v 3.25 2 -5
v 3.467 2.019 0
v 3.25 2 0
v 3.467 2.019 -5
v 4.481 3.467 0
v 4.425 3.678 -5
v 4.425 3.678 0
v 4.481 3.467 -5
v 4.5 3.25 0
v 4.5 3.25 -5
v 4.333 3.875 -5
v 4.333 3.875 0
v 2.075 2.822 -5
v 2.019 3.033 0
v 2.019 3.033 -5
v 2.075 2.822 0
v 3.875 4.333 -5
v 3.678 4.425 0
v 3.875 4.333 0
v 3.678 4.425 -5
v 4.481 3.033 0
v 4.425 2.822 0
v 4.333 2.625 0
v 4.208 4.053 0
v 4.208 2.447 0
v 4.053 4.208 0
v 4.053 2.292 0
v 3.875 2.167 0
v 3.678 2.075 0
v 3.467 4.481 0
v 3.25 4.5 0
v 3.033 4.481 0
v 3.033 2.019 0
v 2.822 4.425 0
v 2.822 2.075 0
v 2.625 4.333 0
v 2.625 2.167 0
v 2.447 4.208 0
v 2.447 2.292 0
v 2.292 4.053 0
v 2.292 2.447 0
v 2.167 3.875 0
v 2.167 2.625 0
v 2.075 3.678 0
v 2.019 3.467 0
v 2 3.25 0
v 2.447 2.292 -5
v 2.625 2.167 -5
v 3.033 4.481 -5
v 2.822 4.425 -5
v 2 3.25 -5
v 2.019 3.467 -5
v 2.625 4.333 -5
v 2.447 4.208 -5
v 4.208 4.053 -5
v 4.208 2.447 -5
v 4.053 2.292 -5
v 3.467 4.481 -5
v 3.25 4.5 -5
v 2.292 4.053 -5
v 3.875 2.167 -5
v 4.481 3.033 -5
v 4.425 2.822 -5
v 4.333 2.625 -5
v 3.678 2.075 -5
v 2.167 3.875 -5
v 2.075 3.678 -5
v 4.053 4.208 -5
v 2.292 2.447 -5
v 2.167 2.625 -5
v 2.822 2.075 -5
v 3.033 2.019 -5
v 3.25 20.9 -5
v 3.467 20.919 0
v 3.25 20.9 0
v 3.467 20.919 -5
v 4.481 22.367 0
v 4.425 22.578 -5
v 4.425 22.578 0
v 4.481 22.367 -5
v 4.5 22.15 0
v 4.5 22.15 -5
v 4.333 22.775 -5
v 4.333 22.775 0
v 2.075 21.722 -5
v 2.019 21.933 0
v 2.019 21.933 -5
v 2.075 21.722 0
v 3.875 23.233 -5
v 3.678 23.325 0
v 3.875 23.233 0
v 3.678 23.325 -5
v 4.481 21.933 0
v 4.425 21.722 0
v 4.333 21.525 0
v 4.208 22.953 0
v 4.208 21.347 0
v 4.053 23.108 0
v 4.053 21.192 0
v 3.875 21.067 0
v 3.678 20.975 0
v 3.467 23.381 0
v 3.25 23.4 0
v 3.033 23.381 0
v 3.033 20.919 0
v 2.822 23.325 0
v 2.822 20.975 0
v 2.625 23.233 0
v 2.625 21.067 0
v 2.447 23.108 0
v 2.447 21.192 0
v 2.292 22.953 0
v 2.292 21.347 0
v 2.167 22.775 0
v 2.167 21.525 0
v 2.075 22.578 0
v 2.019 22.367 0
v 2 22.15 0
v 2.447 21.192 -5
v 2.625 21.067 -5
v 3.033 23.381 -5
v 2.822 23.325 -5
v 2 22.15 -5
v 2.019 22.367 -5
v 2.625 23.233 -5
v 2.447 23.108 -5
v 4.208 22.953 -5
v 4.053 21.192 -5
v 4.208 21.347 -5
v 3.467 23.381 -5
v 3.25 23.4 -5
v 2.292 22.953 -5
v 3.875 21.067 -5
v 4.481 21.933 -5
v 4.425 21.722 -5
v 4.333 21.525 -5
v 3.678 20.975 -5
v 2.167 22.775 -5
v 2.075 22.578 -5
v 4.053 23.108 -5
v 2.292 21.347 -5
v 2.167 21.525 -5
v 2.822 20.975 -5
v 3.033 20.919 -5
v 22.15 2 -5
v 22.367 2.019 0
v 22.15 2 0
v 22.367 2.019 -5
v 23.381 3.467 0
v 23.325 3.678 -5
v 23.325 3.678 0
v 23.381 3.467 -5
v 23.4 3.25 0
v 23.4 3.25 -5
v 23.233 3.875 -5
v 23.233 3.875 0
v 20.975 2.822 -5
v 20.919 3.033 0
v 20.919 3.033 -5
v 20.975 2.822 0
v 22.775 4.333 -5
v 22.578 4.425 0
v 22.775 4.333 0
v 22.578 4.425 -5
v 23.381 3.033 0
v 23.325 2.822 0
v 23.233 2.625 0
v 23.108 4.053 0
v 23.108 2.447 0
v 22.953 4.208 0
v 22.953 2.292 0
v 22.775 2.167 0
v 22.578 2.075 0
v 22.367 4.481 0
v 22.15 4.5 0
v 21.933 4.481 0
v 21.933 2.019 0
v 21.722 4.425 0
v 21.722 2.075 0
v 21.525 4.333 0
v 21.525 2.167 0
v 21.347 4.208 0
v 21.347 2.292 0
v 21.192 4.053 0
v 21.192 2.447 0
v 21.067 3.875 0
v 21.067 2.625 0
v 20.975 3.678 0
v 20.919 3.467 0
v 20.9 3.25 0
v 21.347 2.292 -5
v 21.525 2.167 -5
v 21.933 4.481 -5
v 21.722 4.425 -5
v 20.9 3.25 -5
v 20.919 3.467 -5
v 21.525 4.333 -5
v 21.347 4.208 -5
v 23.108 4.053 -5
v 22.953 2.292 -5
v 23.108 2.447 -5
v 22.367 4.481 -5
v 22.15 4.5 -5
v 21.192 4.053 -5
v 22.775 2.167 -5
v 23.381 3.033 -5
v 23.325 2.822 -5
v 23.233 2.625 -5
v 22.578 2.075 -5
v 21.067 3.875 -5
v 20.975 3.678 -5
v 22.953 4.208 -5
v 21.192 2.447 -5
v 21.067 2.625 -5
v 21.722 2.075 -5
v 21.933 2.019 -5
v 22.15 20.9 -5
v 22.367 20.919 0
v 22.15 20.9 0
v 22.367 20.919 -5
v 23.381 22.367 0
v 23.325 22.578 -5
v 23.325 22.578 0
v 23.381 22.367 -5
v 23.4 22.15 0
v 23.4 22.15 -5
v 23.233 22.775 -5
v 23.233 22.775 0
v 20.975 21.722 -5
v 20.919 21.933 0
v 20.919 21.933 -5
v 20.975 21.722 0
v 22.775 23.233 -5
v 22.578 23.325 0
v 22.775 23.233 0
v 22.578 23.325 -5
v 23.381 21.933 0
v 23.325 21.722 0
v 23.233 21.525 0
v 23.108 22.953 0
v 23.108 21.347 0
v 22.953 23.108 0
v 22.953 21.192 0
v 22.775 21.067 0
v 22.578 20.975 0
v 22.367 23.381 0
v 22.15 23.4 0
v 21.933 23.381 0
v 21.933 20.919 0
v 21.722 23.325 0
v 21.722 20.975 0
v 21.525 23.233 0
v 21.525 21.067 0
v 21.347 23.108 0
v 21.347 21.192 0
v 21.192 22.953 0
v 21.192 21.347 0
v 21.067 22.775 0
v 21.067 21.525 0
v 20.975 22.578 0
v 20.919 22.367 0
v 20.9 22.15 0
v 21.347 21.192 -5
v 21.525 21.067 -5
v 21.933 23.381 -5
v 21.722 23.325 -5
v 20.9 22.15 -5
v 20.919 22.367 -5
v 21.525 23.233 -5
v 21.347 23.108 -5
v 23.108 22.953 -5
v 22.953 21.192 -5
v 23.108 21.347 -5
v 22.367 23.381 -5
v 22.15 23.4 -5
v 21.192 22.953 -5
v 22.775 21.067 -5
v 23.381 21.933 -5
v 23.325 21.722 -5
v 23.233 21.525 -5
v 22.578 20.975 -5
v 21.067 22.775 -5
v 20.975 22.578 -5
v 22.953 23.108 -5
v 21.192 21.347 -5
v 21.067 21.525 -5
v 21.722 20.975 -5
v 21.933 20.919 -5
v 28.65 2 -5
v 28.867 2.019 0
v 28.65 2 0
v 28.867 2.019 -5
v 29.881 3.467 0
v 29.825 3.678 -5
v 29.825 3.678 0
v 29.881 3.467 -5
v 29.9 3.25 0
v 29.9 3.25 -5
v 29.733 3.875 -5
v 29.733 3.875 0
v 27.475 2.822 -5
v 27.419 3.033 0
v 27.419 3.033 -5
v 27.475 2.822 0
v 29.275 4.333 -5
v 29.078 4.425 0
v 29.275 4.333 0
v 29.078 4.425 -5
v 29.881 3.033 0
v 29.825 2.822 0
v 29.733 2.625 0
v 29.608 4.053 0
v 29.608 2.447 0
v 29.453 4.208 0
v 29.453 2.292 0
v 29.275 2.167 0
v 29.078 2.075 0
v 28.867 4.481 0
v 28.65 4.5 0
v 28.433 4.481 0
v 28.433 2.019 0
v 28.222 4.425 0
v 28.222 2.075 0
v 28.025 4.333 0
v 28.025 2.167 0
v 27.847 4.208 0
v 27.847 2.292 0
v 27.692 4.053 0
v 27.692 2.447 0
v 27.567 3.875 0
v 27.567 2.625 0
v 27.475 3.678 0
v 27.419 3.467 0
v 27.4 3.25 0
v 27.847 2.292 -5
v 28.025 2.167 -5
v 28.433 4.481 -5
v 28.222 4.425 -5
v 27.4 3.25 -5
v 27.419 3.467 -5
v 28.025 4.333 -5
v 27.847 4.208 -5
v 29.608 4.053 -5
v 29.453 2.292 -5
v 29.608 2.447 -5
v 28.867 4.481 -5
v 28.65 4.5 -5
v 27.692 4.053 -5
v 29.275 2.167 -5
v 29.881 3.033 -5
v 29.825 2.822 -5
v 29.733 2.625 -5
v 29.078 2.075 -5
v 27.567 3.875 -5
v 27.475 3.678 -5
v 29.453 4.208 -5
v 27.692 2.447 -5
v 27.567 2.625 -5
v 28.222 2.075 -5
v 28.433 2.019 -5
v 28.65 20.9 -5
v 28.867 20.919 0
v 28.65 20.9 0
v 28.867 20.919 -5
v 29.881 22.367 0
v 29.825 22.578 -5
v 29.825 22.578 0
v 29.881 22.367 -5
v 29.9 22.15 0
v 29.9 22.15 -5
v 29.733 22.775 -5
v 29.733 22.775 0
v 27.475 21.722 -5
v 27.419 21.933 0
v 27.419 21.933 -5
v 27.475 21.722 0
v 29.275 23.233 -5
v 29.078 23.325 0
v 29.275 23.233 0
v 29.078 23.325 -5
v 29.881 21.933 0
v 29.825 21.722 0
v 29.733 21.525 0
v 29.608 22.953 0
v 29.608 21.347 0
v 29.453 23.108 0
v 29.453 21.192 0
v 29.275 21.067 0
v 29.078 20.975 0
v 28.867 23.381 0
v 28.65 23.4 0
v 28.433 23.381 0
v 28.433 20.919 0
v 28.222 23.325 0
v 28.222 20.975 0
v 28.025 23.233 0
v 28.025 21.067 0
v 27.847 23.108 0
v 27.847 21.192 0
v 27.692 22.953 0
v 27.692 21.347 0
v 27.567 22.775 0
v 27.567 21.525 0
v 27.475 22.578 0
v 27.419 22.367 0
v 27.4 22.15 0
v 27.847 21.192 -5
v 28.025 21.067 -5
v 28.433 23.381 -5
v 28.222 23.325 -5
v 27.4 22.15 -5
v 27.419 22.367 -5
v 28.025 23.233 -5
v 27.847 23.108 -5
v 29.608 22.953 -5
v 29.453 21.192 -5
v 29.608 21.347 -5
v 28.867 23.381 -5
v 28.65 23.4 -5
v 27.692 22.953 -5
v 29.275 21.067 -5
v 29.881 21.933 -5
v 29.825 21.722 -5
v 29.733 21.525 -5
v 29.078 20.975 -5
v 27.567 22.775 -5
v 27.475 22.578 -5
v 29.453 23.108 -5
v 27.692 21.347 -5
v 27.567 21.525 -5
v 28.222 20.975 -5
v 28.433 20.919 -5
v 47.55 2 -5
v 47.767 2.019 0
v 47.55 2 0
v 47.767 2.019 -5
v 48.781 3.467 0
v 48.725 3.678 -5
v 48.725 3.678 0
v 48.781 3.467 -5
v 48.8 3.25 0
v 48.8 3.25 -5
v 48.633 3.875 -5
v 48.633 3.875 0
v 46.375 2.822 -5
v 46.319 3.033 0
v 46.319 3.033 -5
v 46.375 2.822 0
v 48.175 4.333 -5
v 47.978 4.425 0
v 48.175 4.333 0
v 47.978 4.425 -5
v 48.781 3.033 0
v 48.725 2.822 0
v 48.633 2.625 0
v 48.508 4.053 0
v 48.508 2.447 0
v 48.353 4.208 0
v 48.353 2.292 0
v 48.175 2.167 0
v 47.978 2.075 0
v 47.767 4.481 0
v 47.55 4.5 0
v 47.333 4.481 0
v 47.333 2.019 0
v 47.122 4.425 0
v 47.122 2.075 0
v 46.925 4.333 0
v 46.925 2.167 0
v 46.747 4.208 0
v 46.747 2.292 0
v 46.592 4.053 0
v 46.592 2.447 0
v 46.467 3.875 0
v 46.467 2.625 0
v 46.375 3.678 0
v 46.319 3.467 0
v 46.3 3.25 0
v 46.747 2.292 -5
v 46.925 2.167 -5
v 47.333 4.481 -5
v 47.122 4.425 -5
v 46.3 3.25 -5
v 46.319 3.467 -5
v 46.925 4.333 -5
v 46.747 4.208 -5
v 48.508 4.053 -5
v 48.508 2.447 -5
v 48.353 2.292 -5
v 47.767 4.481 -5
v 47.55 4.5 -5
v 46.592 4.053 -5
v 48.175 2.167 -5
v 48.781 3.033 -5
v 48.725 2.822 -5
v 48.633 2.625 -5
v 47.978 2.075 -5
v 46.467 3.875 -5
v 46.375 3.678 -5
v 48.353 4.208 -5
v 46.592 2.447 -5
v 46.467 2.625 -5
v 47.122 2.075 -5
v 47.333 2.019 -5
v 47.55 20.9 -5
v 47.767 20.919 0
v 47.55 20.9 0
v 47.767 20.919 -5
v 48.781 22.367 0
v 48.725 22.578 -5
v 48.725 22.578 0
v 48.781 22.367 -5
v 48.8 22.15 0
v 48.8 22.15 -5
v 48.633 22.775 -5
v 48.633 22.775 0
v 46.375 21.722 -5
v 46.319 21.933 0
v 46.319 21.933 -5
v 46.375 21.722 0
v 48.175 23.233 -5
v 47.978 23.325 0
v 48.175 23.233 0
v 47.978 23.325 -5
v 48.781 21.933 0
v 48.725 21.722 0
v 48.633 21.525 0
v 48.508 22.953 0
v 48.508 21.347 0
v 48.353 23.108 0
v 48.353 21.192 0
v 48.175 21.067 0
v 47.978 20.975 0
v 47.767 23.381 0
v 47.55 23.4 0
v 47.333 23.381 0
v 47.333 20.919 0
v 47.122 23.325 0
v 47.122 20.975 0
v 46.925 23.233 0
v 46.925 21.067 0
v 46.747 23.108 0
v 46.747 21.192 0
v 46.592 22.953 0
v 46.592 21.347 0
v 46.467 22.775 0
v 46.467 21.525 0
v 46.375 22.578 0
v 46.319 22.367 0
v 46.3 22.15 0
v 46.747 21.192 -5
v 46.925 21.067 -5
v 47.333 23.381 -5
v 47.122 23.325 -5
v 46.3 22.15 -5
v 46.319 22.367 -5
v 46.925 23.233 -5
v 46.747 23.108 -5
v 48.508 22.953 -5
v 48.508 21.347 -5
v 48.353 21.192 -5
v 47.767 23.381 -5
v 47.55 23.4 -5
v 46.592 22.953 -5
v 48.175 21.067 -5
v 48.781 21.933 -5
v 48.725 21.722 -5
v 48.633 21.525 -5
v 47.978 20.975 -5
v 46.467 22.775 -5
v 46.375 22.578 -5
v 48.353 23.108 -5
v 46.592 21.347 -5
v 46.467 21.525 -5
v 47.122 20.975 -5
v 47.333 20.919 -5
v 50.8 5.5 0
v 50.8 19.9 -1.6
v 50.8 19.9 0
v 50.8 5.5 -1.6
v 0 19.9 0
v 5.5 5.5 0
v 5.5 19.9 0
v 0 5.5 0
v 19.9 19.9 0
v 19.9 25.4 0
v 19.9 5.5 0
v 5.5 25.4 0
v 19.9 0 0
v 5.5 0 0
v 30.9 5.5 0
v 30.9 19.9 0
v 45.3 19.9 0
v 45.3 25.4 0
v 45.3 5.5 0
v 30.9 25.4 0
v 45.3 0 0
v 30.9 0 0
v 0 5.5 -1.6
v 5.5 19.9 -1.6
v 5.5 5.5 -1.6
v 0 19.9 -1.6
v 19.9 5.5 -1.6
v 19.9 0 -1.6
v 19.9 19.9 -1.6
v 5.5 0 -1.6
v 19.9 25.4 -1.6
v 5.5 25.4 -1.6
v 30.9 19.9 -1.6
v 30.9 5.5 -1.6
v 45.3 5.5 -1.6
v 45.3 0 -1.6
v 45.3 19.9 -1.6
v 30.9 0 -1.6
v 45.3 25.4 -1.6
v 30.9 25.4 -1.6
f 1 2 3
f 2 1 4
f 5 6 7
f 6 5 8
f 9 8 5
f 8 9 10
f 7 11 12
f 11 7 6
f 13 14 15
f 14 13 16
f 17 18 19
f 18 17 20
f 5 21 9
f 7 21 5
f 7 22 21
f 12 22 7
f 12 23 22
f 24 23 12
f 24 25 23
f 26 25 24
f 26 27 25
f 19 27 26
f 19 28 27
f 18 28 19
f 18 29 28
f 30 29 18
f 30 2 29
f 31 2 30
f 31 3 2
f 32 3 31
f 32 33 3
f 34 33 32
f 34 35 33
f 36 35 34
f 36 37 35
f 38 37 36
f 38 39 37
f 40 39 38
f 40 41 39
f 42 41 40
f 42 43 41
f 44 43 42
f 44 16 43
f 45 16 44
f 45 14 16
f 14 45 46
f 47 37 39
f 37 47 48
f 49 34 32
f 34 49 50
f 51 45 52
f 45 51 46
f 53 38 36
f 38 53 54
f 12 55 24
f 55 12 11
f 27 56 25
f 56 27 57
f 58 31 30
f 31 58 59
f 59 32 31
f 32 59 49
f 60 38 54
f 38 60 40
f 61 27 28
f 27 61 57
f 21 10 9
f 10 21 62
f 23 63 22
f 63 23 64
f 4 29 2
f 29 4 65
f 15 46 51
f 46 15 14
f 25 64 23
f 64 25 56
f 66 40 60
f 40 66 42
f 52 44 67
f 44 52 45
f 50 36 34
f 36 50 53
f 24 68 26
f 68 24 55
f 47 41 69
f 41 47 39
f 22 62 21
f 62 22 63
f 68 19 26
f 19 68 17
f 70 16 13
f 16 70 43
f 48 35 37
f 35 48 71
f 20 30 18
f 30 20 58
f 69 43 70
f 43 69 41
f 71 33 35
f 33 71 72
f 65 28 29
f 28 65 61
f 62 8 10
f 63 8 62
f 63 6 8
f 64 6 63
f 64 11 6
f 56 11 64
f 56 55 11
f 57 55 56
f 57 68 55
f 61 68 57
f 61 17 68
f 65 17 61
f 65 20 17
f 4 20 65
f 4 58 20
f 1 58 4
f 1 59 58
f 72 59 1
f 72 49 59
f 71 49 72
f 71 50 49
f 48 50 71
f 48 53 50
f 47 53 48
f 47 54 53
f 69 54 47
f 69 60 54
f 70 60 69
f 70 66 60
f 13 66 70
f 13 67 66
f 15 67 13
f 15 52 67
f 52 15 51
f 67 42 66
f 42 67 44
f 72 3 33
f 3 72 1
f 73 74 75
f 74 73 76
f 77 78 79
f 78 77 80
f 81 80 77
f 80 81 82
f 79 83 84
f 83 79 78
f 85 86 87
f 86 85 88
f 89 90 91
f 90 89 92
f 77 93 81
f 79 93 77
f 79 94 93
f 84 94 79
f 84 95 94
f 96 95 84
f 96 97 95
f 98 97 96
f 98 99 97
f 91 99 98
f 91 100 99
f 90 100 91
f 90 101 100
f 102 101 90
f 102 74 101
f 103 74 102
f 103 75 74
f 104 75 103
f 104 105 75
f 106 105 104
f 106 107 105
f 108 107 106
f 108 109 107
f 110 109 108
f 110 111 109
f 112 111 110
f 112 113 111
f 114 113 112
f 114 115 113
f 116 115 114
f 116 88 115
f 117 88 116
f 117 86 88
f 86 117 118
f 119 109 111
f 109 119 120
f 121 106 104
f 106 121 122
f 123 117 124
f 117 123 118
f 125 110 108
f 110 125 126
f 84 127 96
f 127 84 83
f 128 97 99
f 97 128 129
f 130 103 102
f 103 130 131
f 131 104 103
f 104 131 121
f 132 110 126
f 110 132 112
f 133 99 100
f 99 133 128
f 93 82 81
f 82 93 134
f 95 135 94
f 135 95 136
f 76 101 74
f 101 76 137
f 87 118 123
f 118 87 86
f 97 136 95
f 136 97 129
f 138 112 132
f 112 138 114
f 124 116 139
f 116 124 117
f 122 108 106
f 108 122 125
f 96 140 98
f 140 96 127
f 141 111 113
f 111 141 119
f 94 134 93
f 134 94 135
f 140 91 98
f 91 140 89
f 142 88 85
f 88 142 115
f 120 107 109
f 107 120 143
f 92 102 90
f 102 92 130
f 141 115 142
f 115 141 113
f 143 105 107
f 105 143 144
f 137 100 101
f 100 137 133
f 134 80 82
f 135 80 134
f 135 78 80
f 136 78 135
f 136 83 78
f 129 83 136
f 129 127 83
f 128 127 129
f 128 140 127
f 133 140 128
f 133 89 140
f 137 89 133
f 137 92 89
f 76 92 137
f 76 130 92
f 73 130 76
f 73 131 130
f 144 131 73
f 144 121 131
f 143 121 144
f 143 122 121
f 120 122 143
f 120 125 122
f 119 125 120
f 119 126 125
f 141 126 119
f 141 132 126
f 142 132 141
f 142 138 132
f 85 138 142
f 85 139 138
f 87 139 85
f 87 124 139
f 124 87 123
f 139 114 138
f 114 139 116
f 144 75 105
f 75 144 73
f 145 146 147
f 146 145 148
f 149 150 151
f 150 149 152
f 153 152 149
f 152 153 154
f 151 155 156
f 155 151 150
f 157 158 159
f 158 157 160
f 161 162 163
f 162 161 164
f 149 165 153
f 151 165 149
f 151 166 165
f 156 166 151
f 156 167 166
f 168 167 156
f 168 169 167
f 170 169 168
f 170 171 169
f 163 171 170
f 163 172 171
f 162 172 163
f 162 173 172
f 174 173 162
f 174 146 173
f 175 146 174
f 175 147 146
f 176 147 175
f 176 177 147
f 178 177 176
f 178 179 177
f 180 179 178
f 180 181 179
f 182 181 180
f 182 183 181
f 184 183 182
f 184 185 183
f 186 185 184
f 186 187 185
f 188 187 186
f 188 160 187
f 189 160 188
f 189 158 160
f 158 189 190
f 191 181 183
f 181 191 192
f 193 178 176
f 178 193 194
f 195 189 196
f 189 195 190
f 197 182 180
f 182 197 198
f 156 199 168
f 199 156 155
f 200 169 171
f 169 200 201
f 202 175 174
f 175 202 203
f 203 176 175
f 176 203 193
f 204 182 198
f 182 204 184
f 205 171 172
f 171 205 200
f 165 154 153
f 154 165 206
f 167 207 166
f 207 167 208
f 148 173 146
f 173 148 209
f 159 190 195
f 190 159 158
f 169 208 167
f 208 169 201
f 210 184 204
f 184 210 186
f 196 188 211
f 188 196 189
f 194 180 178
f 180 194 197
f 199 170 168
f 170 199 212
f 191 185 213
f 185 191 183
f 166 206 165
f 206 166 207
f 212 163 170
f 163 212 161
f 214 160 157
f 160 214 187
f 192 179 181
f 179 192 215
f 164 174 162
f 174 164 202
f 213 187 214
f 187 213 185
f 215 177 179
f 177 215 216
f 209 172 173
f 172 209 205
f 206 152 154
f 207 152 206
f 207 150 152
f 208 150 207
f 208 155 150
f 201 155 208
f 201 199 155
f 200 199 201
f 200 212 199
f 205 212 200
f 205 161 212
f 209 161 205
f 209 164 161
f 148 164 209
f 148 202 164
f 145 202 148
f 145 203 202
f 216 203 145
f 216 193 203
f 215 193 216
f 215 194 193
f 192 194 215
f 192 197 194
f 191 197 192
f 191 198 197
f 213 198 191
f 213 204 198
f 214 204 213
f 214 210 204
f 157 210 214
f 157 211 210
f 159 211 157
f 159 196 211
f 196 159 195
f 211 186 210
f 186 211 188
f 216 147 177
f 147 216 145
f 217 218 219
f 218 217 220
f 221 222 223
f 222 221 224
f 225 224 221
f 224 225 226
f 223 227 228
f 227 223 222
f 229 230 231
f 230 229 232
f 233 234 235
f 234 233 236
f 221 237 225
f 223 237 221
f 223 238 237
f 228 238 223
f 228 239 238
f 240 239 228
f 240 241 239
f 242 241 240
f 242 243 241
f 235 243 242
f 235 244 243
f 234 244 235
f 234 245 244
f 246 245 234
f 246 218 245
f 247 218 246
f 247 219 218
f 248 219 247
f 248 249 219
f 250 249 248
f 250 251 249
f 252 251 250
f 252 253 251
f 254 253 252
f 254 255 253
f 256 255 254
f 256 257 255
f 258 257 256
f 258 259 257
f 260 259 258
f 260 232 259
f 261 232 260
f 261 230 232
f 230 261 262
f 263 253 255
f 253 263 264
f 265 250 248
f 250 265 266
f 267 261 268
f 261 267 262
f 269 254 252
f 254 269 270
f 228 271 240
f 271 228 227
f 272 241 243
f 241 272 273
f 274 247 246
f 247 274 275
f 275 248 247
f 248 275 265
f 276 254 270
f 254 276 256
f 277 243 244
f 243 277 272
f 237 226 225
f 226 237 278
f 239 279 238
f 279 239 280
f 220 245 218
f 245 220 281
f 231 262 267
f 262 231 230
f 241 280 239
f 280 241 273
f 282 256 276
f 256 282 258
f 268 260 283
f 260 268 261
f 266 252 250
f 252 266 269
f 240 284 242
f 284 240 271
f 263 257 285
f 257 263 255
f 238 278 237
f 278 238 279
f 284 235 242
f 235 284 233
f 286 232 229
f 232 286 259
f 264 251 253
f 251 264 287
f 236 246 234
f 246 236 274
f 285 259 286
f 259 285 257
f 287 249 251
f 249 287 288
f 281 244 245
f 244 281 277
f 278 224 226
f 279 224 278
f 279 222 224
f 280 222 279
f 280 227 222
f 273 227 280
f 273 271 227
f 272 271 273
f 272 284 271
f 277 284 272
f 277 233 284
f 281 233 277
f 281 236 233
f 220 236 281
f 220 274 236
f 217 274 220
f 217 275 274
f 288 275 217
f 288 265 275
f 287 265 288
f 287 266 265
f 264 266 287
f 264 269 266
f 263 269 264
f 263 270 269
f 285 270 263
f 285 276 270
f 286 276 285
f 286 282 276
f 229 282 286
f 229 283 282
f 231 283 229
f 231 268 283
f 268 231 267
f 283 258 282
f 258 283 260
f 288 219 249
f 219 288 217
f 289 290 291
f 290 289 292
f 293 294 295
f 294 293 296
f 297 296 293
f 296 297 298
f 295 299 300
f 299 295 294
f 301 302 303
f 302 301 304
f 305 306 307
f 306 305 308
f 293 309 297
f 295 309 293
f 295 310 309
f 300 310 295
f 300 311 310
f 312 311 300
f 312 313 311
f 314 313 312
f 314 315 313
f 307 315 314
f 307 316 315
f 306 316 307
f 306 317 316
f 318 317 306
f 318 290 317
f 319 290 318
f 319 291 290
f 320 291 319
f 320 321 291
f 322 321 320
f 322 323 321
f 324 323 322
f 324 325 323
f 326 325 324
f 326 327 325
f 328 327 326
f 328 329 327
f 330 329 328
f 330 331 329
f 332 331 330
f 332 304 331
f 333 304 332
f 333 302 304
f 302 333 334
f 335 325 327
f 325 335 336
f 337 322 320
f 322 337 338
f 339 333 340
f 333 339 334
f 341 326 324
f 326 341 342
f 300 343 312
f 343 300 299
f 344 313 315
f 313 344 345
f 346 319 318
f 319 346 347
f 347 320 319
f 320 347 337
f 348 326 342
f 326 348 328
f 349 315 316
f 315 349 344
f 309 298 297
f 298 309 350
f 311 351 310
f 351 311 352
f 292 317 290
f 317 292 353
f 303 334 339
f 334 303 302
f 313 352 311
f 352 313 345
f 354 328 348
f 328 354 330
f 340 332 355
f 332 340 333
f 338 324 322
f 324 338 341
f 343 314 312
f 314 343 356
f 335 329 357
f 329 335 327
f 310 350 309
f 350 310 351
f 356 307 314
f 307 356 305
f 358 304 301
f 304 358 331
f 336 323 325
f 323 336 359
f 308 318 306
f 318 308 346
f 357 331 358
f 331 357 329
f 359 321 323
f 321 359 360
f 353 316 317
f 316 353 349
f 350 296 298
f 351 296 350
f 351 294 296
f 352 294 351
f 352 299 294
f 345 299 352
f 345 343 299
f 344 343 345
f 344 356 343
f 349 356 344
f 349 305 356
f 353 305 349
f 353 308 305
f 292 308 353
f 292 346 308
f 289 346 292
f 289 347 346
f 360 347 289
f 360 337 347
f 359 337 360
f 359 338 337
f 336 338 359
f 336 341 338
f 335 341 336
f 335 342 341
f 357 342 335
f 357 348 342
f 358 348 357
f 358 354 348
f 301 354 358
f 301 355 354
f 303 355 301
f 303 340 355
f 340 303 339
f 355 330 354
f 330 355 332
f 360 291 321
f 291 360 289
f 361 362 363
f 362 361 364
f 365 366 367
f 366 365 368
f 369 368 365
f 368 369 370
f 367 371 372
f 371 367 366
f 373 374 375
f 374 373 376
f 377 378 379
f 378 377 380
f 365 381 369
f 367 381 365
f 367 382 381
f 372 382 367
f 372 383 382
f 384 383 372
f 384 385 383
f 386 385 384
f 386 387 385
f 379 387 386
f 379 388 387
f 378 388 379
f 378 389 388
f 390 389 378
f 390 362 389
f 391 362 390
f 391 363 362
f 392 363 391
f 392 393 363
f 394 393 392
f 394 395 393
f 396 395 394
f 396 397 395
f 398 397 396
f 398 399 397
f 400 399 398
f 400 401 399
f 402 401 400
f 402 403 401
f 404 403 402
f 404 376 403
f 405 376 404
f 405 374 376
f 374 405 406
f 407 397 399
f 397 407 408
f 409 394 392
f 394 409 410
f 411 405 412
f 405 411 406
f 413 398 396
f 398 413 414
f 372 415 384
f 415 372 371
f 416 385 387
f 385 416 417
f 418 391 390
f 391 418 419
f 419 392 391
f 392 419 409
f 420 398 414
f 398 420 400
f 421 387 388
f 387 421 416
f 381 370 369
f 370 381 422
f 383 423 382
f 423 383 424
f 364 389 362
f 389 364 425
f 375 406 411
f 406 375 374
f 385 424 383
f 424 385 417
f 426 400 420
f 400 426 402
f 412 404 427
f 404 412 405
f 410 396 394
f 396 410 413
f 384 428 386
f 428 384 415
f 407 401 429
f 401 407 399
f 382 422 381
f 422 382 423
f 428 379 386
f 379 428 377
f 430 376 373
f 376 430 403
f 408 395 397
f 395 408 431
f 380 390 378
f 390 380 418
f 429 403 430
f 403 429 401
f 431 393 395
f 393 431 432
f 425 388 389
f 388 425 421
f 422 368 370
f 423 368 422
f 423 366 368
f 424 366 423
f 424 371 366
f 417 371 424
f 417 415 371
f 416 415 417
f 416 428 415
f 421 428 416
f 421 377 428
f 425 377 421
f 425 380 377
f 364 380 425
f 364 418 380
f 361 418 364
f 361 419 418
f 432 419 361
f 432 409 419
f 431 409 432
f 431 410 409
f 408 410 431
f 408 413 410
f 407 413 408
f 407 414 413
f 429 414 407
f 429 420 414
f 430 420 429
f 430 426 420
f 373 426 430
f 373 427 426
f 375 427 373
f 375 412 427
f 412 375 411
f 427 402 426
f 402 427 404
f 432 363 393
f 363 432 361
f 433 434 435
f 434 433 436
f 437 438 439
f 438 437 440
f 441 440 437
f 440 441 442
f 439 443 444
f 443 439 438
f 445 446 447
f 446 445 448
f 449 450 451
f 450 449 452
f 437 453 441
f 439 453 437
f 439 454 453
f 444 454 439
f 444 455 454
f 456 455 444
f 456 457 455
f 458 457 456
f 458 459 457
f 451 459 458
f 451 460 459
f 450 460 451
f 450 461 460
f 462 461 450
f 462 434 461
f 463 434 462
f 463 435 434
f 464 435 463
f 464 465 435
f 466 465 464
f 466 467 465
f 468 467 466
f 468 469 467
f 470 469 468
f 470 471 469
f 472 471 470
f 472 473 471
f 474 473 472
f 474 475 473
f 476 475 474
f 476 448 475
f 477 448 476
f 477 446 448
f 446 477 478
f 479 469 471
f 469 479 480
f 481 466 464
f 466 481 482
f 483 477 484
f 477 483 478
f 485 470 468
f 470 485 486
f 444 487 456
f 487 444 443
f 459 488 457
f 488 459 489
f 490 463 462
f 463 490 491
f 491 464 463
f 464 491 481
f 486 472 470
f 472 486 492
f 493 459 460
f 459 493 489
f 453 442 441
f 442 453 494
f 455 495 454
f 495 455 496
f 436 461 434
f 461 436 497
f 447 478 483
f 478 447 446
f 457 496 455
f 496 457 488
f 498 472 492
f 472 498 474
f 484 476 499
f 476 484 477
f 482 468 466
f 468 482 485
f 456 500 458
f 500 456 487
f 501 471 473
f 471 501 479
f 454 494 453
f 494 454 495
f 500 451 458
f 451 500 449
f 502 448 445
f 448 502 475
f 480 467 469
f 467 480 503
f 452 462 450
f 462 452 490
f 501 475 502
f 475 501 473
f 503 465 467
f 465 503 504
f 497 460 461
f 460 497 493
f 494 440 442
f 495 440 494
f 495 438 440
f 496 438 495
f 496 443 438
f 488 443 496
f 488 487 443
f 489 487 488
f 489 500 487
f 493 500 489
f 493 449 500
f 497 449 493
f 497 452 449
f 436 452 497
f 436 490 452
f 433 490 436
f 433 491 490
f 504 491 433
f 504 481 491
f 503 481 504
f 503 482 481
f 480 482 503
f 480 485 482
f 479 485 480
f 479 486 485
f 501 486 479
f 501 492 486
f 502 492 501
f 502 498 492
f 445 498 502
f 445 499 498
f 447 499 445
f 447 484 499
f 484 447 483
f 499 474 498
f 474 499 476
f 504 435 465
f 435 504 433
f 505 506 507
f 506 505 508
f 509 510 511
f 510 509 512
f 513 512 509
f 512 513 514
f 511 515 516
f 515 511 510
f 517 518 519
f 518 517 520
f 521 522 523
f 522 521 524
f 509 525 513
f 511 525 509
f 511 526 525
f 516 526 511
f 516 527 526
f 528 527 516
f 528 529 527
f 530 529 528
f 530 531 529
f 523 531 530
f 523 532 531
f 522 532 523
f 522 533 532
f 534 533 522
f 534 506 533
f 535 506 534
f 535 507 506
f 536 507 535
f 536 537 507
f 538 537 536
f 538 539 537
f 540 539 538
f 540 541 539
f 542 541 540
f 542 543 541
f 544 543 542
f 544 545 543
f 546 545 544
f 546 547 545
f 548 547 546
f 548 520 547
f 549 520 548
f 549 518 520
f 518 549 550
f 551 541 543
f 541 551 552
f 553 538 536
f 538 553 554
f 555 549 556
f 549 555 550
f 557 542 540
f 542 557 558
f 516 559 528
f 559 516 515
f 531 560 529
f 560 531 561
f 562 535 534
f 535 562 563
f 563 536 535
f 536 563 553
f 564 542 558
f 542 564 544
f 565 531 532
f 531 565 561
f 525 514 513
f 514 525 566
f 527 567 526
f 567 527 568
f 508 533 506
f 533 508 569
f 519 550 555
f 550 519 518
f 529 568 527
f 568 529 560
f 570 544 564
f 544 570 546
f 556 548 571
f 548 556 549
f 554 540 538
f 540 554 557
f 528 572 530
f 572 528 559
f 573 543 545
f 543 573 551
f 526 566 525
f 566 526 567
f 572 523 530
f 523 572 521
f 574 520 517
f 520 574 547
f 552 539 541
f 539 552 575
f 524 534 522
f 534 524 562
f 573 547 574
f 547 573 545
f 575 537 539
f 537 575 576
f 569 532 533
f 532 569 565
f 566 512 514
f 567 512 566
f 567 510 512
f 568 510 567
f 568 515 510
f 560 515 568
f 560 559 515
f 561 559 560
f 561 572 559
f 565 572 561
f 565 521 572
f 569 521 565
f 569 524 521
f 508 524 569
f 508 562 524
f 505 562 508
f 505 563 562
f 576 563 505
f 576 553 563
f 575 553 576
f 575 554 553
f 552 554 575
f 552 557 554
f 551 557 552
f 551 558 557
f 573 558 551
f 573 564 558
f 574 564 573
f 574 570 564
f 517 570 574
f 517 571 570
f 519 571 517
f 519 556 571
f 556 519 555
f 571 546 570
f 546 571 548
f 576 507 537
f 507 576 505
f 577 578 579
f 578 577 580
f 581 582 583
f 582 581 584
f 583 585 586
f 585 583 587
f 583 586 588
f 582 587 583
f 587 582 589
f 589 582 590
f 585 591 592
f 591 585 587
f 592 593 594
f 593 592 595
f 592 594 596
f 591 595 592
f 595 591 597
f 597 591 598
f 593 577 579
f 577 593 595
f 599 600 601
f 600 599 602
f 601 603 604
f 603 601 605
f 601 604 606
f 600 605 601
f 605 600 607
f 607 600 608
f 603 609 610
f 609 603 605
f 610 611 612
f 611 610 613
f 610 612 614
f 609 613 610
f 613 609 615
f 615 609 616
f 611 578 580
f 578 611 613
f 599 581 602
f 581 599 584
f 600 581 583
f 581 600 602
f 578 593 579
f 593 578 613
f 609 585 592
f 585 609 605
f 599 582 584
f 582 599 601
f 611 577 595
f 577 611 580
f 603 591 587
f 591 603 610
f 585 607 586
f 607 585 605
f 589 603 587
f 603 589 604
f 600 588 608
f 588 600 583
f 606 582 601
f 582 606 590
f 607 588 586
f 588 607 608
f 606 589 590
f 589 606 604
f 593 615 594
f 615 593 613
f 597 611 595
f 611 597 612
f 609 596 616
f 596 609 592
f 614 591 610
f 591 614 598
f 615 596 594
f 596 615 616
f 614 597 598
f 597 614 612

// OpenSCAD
// file: posts.scad
/* Developed by Alex Grutter */

$fn = 36;

four_posts_with_supports(10, 3, 2, 25, 50, 5, 1, [0,0,0,0], 1, true);

module four_posts(post_height, post_outer_diameter, post_inner_diameter, post_spacing_width, post_spacing_length){
    difference()
    {
		/* Outer part */
		union()
		{
            translate([0, 0, 0])
            {
                cylinder(h = post_height, d = post_outer_diameter);
            }
            translate([0, post_spacing_length + 0, 0])
            {
                cylinder(h = post_height, d = post_outer_diameter);
            }
            translate([post_spacing_width + 0, 0, 0])
            {
                cylinder(h = post_height, d = post_outer_diameter);
            }
            translate([post_spacing_width + 0, post_spacing_length + 0, 0])
            {
                cylinder(h = post_height, d = post_outer_diameter);
            }
		}
		/* Inner hole */
        union()
        {
            translate([0, 0, -1])
            {
                cylinder(h = post_height+2, d = post_inner_diameter);
            }
            translate([0, post_spacing_length + 0, -1])
            {
                cylinder(h = post_height+2, d = post_inner_diameter);
            }
            translate([post_spacing_width + 0, 0, -1])
            {
                cylinder(h = post_height+2, d = post_inner_diameter);
            }
            translate([post_spacing_width + 0, post_spacing_length + 0, -1])
            {
                cylinder(h = post_height+2, d = post_inner_diameter);
            }
        }
	}
};

module four_posts_with_supports(post_height, post_outer_diameter, post_inner_diameter, post_spacing_width, post_spacing_length, support_diameter, support_count, support_start_angle, support_thickness, flip){
    difference()
    {
		/* Outer part */
		union()
		{
            translate([0, 0, 0])
            {
                cylinder(h = post_height, d = post_outer_diameter);
				for(support = [0 : support_count])
				{
					if(flip)
					{
						translate([0, 0, post_height])
						rotate([support_start_angle[0] + ( support * (360 / support_count)),90,0])
						translate([0, 0, -(support_thickness / 2)])
						linear_extrude(support_thickness)
						polygon([[post_height, (post_inner_diameter / 2)],[0, (post_inner_diameter / 2)],[0,(support_diameter / 2)]], [[0,1,2]]);
					}
					else
					{
						rotate([support_start_angle[0] + ( support * (360 / support_count)),-90,0])
						translate([0, 0, -(support_thickness / 2)])
						linear_extrude(support_thickness)
						polygon([[post_height, (post_inner_diameter / 2)],[0, (post_inner_diameter / 2)],[0, (support_diameter / 2)]], [[0,1,2]]);
					}
				}
            }
            translate([0, post_spacing_length + 0, 0])
            {
                cylinder(h = post_height, d = post_outer_diameter);
				for(support = [0 : support_count])
				{
					if(flip)
					{
						translate([0, 0, post_height])
						rotate([support_start_angle[1] + ( support * (360 / support_count)),90,0])
						translate([0, 0, -(support_thickness / 2)])
						linear_extrude(support_thickness)
						polygon([[post_height, (post_inner_diameter / 2)],[0, (post_inner_diameter / 2)],[0,(support_diameter / 2)]], [[0,1,2]]);
					}
					else
					{
						rotate([support_start_angle[1] + ( support * (360 / support_count)),-90,0])
						translate([0, 0, -(support_thickness / 2)])
						linear_extrude(support_thickness)
						polygon([[post_height, (post_inner_diameter / 2)],[0, (post_inner_diameter / 2)],[0,(support_diameter / 2)]], [[0,1,2]]);
					}
				}
            }
            translate([post_spacing_width + 0, 0, 0])
            {
                cylinder(h = post_height, d = post_outer_diameter);
				for(support = [0 : support_count])
				{
					if(flip)
					{
						translate([0, 0, post_height])
						rotate([support_start_angle[2] + ( support * (360 / support_count)),90,0])
						translate([0, 0, -(support_thickness / 2)])
						linear_extrude(support_thickness)
						polygon([[post_height, (post_inner_diameter / 2)],[0, (post_inner_diameter / 2)],[0,(support_diameter / 2)]], [[0,1,2]]);
					}
					else
					{
						rotate([support_start_angle[2] + ( support * (360 / support_count)),-90,0])
						translate([0, 0, -(support_thickness / 2)])
						linear_extrude(support_thickness)
						polygon([[post_height, (post_inner_diameter / 2)],[0, (post_inner_diameter / 2)],[0,(support_diameter / 2)]], [[0,1,2]]);
					}
				}
            }
            translate([post_spacing_width + 0, post_spacing_length + 0, 0])
            {
                cylinder(h = post_height, d = post_outer_diameter);
				for(support = [0 : support_count])
				{
					if(flip)
					{
						translate([0, 0, post_height])
						rotate([support_start_angle[3] + ( support * (360 / support_count)),90,0])
						translate([0, 0, -(support_thickness / 2)])
						linear_extrude(support_thickness)
						polygon([[post_height, (post_inner_diameter / 2)],[0, (post_inner_diameter / 2)],[0,(support_diameter / 2)]], [[0,1,2]]);
					}
					else
					{
						rotate([support_start_angle[3] + ( support * (360 / support_count)),-90,0])
						translate([0, 0, -(support_thickness / 2)])
						linear_extrude(support_thickness)
						polygon([[post_height, (post_inner_diameter / 2)],[0, (post_inner_diameter / 2)],[0,(support_diameter / 2)]], [[0,1,2]]);
					}
				}
            }
		}
        
		/* Inner hole */
        union()
        {
            translate([0, 0, -1])
            {
                cylinder(h = post_height+2, d = post_inner_diameter);
            }
            translate([0, post_spacing_length + 0, -1])
            {
                cylinder(h = post_height+2, d = post_inner_diameter);
            }
            translate([post_spacing_width + 0, 0, -1])
            {
                cylinder(h = post_height+2, d = post_inner_diameter);
            }
            translate([post_spacing_width + 0, post_spacing_length + 0, -1])
            {
                cylinder(h = post_height+2, d = post_inner_diameter);
            }
        }
	}
};
// main file
use <posts.scad>

/* Examples for viewing */
lynxmotion_lss_servo_holes();

module lynxmotion_lss_servo_holes()
{
    /* Hole parameters */
    mount_hole_depth                = 5;
    hole_inner_diameter             = 2.5;

    /* Dimensions retrieved from https://www.robotshop.com/info/wiki/lynxmotion/view/lynxmotion-smart-servo/lss-mechanical/ */
    servo_length                    = 50.8;
    servo_width                     = 25.4;
    servo_depth                     = 38.1;

    servo_base_hole_edge_offset     = 3.25;
//    servo_base_pattern_edge_offset  = 6.50; // This is what was in the documentation
    servo_base_pattern_edge_offset  = 5.50; // Make it smaller because of the curves in the servos
    servo_base_hole_major_offset    = 18.9;
    servo_base_to_base_depth        = 34.9;
    servo_base_cutout_width         = servo_width - (2 * servo_base_pattern_edge_offset);
    servo_base_cutout_length        = servo_length;
    servo_base_cutout_depth         = (servo_depth - servo_base_to_base_depth) / 2;
    
    servo_horn_hole_major_offset    = 16.7;
    servo_horn_to_horn_offset       = servo_width;
    servo_horn_to_horn_depth        = 49.27;
    servo_horn_diameter             = servo_width;

    /* Length positioning parameters */
    hole1_offset_length             = servo_base_hole_edge_offset;
    hole2_offset_length             = hole1_offset_length;
    hole3_offset_length             = servo_base_hole_edge_offset + servo_base_hole_major_offset;
    hole4_offset_length             = hole3_offset_length;
    hole5_offset_length             = servo_base_hole_edge_offset + (servo_length / 2);
    hole6_offset_length             = hole5_offset_length;
    hole7_offset_length             = servo_base_hole_edge_offset + servo_base_hole_major_offset + (servo_length / 2);
    hole8_offset_length             = hole7_offset_length;
    hole9_offset_length             = 2 * (servo_length / 4);
    hole10_offset_length            = 1 * (servo_length / 4);
    hole11_offset_length            = 3 * (servo_length / 4);
    
    /* Width positioning parameters */
    hole1_offset_width              = servo_base_hole_edge_offset + servo_base_hole_major_offset;
    hole2_offset_width              = servo_base_hole_edge_offset;
    hole3_offset_width              = hole1_offset_width;
    hole4_offset_width              = hole2_offset_width;
    hole5_offset_width              = servo_base_hole_edge_offset + servo_base_hole_major_offset;
    hole6_offset_width              = servo_base_hole_edge_offset;
    hole7_offset_width              = hole1_offset_width;
    hole8_offset_width              = hole2_offset_width;
    hole9_offset_width              = servo_width / 2;
    hole10_offset_width             = servo_width / 2;
    hole11_offset_width             = servo_width / 2;
    
    /* Hole 1: */
    translate([hole1_offset_length, servo_width - hole1_offset_width, -mount_hole_depth])
    four_posts(mount_hole_depth, hole_inner_diameter, 0, 0, 0);
    
    /* Hole 2: */
    translate([hole2_offset_length, servo_width - hole2_offset_width, -mount_hole_depth])
    four_posts(mount_hole_depth, hole_inner_diameter, 0, 0, 0);
        
    /* Hole 3: */
    translate([hole3_offset_length, servo_width - hole3_offset_width, -mount_hole_depth])
    four_posts(mount_hole_depth, hole_inner_diameter, 0, 0, 0);
    
    /* Hole 4: */
    translate([hole4_offset_length, servo_width - hole4_offset_width, -mount_hole_depth])
    four_posts(mount_hole_depth, hole_inner_diameter, 0, 0, 0);
    
    /* Hole 5: */
    translate([hole5_offset_length, servo_width - hole5_offset_width, -mount_hole_depth])
    four_posts(mount_hole_depth, hole_inner_diameter, 0, 0, 0);
    
    /* Hole 6: */
    translate([hole6_offset_length, servo_width - hole6_offset_width, -mount_hole_depth])
    four_posts(mount_hole_depth, hole_inner_diameter, 0, 0, 0);
        
    /* Hole 7: */
    translate([hole7_offset_length, servo_width - hole7_offset_width, -mount_hole_depth])
    four_posts(mount_hole_depth, hole_inner_diameter, 0, 0, 0);
    
    /* Hole 8: */
    translate([hole8_offset_length, servo_width - hole8_offset_width, -mount_hole_depth])
    four_posts(mount_hole_depth, hole_inner_diameter, 0, 0, 0);
    
    /* Hole 9: */
    translate([hole9_offset_length, servo_width - hole9_offset_width, -(servo_base_cutout_depth / 2)])
    cube([servo_base_cutout_length, servo_base_cutout_width, servo_base_cutout_depth], center = true);

    /* Hole 10: */
    translate([hole10_offset_length, servo_width - hole10_offset_width, -(servo_base_cutout_depth / 2)])
    cube([servo_base_cutout_width, servo_width, servo_base_cutout_depth], center = true);

    /* Hole 11: */
    translate([hole11_offset_length, servo_width - hole11_offset_width, -(servo_base_cutout_depth / 2)])
    cube([servo_base_cutout_width, servo_width, servo_base_cutout_depth], center = true);
}
